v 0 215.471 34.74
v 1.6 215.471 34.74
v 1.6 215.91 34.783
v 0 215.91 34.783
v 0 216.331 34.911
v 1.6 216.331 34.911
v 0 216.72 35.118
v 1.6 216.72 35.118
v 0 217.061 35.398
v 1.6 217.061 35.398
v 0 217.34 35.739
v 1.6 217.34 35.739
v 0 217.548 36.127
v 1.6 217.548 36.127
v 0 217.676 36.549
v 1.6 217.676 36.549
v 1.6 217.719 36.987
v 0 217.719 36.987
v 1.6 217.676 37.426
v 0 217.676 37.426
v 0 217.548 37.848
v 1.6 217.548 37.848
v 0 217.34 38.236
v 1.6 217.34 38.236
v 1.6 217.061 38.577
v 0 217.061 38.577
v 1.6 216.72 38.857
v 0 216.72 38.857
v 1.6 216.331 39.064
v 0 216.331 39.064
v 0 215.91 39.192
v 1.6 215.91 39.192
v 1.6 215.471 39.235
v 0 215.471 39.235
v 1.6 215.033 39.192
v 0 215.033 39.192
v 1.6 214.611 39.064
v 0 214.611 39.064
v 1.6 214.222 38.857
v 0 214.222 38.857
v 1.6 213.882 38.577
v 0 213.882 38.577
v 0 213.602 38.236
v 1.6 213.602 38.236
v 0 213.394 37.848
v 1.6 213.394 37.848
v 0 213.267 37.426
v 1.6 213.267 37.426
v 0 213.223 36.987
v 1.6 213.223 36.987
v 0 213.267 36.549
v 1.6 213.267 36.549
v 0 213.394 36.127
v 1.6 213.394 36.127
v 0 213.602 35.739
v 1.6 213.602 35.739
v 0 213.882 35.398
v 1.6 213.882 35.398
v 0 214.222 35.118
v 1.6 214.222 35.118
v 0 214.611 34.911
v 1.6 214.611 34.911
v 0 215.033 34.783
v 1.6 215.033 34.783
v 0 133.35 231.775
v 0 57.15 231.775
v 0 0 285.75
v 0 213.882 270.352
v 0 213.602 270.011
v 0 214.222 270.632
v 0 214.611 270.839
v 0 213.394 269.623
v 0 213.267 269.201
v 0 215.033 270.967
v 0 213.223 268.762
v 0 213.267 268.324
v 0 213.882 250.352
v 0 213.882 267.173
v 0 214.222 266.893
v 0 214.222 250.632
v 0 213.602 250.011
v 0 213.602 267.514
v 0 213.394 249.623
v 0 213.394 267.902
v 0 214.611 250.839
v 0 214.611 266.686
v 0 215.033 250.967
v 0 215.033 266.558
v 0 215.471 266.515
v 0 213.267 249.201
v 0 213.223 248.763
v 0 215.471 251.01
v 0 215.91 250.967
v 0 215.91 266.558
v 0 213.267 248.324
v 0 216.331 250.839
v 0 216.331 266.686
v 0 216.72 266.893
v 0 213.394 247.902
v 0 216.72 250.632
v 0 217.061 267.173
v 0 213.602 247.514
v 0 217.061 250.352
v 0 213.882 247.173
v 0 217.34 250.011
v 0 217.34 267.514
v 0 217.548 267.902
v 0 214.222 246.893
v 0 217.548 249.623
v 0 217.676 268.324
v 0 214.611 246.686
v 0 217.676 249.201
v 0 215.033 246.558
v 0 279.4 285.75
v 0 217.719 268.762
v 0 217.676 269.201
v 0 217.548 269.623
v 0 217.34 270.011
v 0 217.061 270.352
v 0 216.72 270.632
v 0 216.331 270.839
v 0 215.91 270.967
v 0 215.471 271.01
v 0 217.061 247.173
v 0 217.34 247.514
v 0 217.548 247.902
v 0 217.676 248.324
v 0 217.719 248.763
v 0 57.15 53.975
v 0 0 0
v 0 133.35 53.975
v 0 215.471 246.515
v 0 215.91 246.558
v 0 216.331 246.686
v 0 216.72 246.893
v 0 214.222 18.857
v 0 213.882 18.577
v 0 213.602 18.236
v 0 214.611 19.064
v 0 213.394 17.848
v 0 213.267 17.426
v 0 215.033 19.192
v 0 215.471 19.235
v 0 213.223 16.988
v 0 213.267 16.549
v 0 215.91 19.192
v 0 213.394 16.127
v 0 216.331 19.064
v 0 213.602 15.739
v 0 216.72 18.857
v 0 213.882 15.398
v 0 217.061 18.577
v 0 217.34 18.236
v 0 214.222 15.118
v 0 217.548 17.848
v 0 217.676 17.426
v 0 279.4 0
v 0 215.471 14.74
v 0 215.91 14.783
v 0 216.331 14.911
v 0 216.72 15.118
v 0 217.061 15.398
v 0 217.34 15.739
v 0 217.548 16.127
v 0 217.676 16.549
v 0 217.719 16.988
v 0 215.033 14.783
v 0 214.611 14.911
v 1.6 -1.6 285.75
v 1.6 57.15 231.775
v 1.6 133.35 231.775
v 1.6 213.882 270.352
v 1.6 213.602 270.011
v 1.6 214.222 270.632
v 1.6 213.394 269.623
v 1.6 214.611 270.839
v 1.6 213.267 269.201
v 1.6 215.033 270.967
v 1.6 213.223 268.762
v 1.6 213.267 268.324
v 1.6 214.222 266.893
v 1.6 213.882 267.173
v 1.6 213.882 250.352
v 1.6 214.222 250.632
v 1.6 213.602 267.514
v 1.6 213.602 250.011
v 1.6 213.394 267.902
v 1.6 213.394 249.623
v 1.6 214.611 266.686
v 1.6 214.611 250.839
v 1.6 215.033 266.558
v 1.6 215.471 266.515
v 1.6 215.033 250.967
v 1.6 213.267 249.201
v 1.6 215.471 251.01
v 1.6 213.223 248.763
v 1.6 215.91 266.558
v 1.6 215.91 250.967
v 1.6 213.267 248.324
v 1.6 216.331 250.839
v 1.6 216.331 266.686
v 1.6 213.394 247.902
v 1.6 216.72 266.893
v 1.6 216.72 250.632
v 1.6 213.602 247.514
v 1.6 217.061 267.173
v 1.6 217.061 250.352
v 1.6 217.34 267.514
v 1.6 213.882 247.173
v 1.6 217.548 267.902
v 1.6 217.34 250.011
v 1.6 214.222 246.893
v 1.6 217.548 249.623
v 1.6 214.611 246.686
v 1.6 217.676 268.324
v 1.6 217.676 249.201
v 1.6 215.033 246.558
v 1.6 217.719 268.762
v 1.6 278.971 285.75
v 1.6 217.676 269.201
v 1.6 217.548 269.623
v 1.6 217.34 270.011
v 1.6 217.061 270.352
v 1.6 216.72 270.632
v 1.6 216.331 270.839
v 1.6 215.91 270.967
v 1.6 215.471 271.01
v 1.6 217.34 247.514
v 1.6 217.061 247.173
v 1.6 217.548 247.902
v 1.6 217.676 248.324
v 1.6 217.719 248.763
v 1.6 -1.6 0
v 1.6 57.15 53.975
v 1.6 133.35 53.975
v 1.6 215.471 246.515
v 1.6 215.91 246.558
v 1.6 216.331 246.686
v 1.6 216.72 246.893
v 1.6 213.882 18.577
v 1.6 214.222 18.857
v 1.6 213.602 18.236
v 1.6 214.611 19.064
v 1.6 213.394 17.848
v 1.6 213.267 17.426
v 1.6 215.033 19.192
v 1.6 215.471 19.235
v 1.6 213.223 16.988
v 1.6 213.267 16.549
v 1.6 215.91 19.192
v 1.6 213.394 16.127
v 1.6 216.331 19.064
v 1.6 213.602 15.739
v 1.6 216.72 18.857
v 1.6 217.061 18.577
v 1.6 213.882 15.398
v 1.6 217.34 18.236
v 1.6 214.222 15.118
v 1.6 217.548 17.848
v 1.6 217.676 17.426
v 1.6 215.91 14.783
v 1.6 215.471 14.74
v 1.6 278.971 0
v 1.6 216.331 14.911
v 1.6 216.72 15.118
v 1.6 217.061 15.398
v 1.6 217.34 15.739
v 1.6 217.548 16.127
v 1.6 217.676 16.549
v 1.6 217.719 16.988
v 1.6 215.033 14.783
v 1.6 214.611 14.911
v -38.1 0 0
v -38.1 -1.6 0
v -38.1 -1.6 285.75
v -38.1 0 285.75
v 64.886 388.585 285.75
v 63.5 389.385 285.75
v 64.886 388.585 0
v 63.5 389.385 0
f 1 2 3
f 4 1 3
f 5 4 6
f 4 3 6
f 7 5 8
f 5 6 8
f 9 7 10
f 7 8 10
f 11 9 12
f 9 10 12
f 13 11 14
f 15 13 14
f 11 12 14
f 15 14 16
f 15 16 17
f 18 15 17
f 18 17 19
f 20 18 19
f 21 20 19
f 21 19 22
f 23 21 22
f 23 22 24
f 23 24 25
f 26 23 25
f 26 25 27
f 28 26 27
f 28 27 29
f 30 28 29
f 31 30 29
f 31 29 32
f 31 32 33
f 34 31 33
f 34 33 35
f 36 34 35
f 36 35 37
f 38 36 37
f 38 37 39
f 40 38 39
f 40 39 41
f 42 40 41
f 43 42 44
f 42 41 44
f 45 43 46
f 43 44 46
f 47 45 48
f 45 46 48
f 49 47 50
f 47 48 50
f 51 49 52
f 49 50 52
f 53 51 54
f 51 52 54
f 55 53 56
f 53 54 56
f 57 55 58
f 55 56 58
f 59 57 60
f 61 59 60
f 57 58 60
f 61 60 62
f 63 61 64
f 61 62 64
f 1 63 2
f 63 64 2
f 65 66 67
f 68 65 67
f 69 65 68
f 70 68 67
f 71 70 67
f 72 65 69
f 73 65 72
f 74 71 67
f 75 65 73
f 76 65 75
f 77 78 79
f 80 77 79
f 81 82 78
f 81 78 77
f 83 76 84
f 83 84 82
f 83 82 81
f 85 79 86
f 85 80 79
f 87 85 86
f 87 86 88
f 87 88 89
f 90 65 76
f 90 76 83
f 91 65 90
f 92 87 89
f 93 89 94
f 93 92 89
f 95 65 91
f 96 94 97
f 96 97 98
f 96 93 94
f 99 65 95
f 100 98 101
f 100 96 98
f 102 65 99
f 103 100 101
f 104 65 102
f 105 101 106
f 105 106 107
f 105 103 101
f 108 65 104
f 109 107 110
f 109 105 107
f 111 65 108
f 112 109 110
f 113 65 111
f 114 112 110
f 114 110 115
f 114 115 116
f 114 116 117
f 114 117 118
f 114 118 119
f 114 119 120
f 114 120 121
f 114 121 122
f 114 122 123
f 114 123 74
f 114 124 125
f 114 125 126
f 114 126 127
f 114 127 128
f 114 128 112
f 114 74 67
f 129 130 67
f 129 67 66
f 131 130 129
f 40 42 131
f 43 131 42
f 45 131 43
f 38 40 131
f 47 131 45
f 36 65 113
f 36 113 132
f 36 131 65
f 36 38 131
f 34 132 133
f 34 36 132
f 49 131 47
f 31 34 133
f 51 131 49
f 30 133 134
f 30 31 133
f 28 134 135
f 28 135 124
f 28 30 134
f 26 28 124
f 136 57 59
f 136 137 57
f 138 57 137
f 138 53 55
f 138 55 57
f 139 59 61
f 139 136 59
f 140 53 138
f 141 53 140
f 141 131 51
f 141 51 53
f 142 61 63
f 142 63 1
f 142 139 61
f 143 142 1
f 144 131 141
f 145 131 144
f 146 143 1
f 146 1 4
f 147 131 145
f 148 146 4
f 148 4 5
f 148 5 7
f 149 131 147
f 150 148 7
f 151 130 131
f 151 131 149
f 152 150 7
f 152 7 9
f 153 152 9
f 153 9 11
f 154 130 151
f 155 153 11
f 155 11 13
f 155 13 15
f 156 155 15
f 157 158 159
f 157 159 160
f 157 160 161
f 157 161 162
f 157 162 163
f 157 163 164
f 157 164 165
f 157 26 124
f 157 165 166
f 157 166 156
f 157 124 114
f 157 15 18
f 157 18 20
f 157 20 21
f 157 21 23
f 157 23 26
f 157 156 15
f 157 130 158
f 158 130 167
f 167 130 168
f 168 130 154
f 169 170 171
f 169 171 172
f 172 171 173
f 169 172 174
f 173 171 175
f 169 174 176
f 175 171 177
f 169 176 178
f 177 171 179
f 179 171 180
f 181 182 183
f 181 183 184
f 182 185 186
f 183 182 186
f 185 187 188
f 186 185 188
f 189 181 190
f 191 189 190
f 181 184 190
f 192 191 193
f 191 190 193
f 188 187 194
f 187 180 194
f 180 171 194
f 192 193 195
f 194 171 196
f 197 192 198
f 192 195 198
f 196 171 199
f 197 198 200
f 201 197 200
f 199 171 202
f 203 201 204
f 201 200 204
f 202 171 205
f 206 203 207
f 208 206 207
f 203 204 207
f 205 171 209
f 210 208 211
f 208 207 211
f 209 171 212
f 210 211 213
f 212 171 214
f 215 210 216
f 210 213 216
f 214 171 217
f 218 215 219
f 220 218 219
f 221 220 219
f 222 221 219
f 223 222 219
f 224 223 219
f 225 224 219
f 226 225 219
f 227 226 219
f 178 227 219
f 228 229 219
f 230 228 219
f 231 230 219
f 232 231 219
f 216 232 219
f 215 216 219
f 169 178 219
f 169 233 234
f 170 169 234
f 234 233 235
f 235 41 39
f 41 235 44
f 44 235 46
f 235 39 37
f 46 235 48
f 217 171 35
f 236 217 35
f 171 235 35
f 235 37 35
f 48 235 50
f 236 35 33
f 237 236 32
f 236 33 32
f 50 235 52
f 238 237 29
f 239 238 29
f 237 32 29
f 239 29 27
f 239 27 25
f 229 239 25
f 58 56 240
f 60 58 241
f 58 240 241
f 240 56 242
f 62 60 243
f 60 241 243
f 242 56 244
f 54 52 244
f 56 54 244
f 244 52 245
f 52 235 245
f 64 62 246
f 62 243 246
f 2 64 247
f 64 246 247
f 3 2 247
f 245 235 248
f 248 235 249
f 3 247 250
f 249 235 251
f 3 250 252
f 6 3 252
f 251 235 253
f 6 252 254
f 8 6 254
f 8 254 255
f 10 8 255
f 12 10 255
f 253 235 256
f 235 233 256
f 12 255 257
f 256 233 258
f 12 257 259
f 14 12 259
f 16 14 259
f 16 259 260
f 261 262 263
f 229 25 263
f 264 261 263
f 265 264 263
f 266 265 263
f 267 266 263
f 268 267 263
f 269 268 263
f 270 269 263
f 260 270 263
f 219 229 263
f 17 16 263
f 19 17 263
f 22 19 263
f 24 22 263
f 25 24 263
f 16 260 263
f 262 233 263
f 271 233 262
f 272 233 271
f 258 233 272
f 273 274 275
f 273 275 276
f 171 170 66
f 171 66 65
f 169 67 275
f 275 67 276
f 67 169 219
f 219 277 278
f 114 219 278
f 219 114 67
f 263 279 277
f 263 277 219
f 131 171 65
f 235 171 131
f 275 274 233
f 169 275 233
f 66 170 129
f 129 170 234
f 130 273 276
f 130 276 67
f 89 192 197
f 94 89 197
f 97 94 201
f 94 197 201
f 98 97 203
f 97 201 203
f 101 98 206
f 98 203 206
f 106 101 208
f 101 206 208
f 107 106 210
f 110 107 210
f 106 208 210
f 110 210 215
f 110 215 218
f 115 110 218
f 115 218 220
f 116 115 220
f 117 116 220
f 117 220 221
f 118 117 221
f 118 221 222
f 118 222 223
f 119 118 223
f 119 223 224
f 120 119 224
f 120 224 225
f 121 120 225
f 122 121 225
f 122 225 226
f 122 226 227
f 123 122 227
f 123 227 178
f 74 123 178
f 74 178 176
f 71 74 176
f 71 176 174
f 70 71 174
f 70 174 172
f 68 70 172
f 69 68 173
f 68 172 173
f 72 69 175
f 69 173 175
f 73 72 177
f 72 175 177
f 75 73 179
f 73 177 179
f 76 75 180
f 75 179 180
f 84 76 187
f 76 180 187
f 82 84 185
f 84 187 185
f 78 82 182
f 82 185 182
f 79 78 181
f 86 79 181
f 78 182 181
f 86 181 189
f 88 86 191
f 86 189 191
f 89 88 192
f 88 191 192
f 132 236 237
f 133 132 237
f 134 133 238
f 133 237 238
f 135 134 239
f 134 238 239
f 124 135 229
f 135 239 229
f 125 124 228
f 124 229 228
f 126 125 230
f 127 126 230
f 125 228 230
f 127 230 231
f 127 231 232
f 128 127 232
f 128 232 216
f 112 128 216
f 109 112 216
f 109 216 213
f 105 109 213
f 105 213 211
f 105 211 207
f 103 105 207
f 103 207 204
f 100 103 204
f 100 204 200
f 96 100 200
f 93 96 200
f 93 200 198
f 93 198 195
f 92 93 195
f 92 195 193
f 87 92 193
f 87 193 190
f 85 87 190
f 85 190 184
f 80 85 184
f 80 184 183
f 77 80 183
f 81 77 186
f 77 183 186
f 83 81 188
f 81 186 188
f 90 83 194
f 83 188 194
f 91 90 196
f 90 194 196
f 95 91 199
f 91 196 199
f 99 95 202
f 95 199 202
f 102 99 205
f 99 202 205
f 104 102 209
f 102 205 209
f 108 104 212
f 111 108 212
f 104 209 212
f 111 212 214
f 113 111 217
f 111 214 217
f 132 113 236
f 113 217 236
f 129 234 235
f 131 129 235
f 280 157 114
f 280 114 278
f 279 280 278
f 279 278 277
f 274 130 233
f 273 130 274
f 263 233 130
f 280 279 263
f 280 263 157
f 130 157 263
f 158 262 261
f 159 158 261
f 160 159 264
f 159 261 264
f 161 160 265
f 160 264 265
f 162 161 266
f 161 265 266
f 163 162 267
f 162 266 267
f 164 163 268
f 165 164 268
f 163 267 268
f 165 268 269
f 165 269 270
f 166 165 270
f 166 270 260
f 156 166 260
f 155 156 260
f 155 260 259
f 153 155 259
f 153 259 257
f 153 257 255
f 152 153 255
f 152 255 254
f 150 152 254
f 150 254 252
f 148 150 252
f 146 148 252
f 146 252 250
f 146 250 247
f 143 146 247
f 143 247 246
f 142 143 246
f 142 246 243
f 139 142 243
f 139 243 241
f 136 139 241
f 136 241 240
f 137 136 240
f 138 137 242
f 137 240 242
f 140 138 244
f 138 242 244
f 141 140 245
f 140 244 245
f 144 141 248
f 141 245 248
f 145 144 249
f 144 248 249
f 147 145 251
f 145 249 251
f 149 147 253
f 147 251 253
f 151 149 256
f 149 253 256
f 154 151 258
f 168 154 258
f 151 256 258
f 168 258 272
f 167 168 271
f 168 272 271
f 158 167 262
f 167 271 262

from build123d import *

# Parameters (mm, degrees)
BOSS_EXTRUDE1_DEPTH = 285.75
SKETCH2_W           = 177.8
SKETCH2_H           = 76.2
CUT_EXTRUDE1_DEPTH  = 40.7002
CUT_EXTRUDE2_REACH  = 41.7
SKETCH3_R           = 2.2479


with BuildPart() as part:
    # Sketch1 → Boss-Extrude1 (new body)
    with BuildSketch(Plane.XY):
        Polygon((0, 0), (0, 279.4), (63.5, 389.385226281), (64.885813851, 388.585126281), (1.6002, 278.971227702), (1.6002, 0), (1.6002, -1.6002), (0, -1.6002), (-38.1, -1.6002), (-38.1, 0), align=None)
    extrude(amount=BOSS_EXTRUDE1_DEPTH)

    # Sketch2 → Cut-Extrude1 (cut, through all)
    with BuildSketch(Plane(origin=(1.6002, 0, 0), x_dir=(0, 0, -1), z_dir=(1, 0, 0))):
        with Locations((-142.875, 95.25)):
            Rectangle(SKETCH2_W, SKETCH2_H)
    extrude(amount=-CUT_EXTRUDE1_DEPTH, mode=Mode.SUBTRACT)

    # Sketch3 → Cut-Extrude2 (cut, up to next)
    with BuildSketch(Plane(origin=(1.6002, 0, 0), x_dir=(0, 0, -1), z_dir=(1, 0, 0)), mode=Mode.PRIVATE) as cut_extrude2_sk1:
        with Locations((-268.762499939, 215.471227702)):
            Circle(SKETCH3_R)
    cut_extrude2_tool1 = extrude(cut_extrude2_sk1.sketch, amount=-CUT_EXTRUDE2_REACH, mode=Mode.PRIVATE) & part.part
    add(cut_extrude2_tool1.solids().sort_by_distance((1.6002, 215.471228, 268.7625))[0], mode=Mode.SUBTRACT)
    # Sketch3 → Cut-Extrude2 (cut, up to next)
    with BuildSketch(Plane(origin=(1.6002, 0, 0), x_dir=(0, 0, -1), z_dir=(1, 0, 0)), mode=Mode.PRIVATE) as cut_extrude2_sk2:
        with Locations((-248.762500061, 215.471227702)):
            Circle(SKETCH3_R)
    cut_extrude2_tool2 = extrude(cut_extrude2_sk2.sketch, amount=-CUT_EXTRUDE2_REACH, mode=Mode.PRIVATE) & part.part
    add(cut_extrude2_tool2.solids().sort_by_distance((1.6002, 215.471228, 248.7625))[0], mode=Mode.SUBTRACT)
    # Sketch3 → Cut-Extrude2 (cut, up to next)
    with BuildSketch(Plane(origin=(1.6002, 0, 0), x_dir=(0, 0, -1), z_dir=(1, 0, 0)), mode=Mode.PRIVATE) as cut_extrude2_sk3:
        with Locations((-16.987500061, 215.471227702)):
            Circle(SKETCH3_R)
    cut_extrude2_tool3 = extrude(cut_extrude2_sk3.sketch, amount=-CUT_EXTRUDE2_REACH, mode=Mode.PRIVATE) & part.part
    add(cut_extrude2_tool3.solids().sort_by_distance((1.6002, 215.471228, 16.9875))[0], mode=Mode.SUBTRACT)
    # Sketch3 → Cut-Extrude2 (cut, up to next)
    with BuildSketch(Plane(origin=(1.6002, 0, 0), x_dir=(0, 0, -1), z_dir=(1, 0, 0)), mode=Mode.PRIVATE) as cut_extrude2_sk4:
        with Locations((-36.987499939, 215.471227702)):
            Circle(SKETCH3_R)
    cut_extrude2_tool4 = extrude(cut_extrude2_sk4.sketch, amount=-CUT_EXTRUDE2_REACH, mode=Mode.PRIVATE) & part.part
    add(cut_extrude2_tool4.solids().sort_by_distance((1.6002, 215.471228, 36.9875))[0], mode=Mode.SUBTRACT)


solid = part.part
